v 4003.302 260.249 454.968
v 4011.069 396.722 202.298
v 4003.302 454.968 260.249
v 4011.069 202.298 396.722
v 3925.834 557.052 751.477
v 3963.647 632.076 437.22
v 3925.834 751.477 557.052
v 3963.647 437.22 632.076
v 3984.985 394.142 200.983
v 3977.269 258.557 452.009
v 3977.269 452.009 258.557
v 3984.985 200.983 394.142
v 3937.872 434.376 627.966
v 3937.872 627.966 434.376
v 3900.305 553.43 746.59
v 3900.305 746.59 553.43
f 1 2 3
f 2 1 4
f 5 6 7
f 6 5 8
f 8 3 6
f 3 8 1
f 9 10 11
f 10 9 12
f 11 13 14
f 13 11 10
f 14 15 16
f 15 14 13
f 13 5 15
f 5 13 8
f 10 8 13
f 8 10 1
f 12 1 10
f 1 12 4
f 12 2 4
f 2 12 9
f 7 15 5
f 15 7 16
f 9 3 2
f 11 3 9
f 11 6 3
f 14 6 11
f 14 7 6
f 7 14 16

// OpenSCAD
rotate(45.0, [1.0, 0.0, 0.0]) {
    translate([0.0, 0.0, -6.93889e-15]) {
    intersection() {
    difference() {
    cylinder(h = 315.0, r = 4035.12, $fn=100, center=true);
    cylinder(h = 630.0, r = 4008.88, $fn=100, center=true);
}
    rotate(9.645, [0.0, 0.0, 1.0]) {
    rotate(-90.0, [0.0, 1.0, 0.0]) {
    polyhedron(
    points=[ [165.375,306.074,-4842.15], [165.375,-306.074,-4842.15],
             [-165.375,-306.074,-4842.15], [-165.375,306.074,-4842.15], [0,0,0] ],
    faces=[ [0,1,4], [1,2,4], [2,3,4], [3,0,4], [1,0,3], [2,1,3] ]
);
}
}
}
}
}
